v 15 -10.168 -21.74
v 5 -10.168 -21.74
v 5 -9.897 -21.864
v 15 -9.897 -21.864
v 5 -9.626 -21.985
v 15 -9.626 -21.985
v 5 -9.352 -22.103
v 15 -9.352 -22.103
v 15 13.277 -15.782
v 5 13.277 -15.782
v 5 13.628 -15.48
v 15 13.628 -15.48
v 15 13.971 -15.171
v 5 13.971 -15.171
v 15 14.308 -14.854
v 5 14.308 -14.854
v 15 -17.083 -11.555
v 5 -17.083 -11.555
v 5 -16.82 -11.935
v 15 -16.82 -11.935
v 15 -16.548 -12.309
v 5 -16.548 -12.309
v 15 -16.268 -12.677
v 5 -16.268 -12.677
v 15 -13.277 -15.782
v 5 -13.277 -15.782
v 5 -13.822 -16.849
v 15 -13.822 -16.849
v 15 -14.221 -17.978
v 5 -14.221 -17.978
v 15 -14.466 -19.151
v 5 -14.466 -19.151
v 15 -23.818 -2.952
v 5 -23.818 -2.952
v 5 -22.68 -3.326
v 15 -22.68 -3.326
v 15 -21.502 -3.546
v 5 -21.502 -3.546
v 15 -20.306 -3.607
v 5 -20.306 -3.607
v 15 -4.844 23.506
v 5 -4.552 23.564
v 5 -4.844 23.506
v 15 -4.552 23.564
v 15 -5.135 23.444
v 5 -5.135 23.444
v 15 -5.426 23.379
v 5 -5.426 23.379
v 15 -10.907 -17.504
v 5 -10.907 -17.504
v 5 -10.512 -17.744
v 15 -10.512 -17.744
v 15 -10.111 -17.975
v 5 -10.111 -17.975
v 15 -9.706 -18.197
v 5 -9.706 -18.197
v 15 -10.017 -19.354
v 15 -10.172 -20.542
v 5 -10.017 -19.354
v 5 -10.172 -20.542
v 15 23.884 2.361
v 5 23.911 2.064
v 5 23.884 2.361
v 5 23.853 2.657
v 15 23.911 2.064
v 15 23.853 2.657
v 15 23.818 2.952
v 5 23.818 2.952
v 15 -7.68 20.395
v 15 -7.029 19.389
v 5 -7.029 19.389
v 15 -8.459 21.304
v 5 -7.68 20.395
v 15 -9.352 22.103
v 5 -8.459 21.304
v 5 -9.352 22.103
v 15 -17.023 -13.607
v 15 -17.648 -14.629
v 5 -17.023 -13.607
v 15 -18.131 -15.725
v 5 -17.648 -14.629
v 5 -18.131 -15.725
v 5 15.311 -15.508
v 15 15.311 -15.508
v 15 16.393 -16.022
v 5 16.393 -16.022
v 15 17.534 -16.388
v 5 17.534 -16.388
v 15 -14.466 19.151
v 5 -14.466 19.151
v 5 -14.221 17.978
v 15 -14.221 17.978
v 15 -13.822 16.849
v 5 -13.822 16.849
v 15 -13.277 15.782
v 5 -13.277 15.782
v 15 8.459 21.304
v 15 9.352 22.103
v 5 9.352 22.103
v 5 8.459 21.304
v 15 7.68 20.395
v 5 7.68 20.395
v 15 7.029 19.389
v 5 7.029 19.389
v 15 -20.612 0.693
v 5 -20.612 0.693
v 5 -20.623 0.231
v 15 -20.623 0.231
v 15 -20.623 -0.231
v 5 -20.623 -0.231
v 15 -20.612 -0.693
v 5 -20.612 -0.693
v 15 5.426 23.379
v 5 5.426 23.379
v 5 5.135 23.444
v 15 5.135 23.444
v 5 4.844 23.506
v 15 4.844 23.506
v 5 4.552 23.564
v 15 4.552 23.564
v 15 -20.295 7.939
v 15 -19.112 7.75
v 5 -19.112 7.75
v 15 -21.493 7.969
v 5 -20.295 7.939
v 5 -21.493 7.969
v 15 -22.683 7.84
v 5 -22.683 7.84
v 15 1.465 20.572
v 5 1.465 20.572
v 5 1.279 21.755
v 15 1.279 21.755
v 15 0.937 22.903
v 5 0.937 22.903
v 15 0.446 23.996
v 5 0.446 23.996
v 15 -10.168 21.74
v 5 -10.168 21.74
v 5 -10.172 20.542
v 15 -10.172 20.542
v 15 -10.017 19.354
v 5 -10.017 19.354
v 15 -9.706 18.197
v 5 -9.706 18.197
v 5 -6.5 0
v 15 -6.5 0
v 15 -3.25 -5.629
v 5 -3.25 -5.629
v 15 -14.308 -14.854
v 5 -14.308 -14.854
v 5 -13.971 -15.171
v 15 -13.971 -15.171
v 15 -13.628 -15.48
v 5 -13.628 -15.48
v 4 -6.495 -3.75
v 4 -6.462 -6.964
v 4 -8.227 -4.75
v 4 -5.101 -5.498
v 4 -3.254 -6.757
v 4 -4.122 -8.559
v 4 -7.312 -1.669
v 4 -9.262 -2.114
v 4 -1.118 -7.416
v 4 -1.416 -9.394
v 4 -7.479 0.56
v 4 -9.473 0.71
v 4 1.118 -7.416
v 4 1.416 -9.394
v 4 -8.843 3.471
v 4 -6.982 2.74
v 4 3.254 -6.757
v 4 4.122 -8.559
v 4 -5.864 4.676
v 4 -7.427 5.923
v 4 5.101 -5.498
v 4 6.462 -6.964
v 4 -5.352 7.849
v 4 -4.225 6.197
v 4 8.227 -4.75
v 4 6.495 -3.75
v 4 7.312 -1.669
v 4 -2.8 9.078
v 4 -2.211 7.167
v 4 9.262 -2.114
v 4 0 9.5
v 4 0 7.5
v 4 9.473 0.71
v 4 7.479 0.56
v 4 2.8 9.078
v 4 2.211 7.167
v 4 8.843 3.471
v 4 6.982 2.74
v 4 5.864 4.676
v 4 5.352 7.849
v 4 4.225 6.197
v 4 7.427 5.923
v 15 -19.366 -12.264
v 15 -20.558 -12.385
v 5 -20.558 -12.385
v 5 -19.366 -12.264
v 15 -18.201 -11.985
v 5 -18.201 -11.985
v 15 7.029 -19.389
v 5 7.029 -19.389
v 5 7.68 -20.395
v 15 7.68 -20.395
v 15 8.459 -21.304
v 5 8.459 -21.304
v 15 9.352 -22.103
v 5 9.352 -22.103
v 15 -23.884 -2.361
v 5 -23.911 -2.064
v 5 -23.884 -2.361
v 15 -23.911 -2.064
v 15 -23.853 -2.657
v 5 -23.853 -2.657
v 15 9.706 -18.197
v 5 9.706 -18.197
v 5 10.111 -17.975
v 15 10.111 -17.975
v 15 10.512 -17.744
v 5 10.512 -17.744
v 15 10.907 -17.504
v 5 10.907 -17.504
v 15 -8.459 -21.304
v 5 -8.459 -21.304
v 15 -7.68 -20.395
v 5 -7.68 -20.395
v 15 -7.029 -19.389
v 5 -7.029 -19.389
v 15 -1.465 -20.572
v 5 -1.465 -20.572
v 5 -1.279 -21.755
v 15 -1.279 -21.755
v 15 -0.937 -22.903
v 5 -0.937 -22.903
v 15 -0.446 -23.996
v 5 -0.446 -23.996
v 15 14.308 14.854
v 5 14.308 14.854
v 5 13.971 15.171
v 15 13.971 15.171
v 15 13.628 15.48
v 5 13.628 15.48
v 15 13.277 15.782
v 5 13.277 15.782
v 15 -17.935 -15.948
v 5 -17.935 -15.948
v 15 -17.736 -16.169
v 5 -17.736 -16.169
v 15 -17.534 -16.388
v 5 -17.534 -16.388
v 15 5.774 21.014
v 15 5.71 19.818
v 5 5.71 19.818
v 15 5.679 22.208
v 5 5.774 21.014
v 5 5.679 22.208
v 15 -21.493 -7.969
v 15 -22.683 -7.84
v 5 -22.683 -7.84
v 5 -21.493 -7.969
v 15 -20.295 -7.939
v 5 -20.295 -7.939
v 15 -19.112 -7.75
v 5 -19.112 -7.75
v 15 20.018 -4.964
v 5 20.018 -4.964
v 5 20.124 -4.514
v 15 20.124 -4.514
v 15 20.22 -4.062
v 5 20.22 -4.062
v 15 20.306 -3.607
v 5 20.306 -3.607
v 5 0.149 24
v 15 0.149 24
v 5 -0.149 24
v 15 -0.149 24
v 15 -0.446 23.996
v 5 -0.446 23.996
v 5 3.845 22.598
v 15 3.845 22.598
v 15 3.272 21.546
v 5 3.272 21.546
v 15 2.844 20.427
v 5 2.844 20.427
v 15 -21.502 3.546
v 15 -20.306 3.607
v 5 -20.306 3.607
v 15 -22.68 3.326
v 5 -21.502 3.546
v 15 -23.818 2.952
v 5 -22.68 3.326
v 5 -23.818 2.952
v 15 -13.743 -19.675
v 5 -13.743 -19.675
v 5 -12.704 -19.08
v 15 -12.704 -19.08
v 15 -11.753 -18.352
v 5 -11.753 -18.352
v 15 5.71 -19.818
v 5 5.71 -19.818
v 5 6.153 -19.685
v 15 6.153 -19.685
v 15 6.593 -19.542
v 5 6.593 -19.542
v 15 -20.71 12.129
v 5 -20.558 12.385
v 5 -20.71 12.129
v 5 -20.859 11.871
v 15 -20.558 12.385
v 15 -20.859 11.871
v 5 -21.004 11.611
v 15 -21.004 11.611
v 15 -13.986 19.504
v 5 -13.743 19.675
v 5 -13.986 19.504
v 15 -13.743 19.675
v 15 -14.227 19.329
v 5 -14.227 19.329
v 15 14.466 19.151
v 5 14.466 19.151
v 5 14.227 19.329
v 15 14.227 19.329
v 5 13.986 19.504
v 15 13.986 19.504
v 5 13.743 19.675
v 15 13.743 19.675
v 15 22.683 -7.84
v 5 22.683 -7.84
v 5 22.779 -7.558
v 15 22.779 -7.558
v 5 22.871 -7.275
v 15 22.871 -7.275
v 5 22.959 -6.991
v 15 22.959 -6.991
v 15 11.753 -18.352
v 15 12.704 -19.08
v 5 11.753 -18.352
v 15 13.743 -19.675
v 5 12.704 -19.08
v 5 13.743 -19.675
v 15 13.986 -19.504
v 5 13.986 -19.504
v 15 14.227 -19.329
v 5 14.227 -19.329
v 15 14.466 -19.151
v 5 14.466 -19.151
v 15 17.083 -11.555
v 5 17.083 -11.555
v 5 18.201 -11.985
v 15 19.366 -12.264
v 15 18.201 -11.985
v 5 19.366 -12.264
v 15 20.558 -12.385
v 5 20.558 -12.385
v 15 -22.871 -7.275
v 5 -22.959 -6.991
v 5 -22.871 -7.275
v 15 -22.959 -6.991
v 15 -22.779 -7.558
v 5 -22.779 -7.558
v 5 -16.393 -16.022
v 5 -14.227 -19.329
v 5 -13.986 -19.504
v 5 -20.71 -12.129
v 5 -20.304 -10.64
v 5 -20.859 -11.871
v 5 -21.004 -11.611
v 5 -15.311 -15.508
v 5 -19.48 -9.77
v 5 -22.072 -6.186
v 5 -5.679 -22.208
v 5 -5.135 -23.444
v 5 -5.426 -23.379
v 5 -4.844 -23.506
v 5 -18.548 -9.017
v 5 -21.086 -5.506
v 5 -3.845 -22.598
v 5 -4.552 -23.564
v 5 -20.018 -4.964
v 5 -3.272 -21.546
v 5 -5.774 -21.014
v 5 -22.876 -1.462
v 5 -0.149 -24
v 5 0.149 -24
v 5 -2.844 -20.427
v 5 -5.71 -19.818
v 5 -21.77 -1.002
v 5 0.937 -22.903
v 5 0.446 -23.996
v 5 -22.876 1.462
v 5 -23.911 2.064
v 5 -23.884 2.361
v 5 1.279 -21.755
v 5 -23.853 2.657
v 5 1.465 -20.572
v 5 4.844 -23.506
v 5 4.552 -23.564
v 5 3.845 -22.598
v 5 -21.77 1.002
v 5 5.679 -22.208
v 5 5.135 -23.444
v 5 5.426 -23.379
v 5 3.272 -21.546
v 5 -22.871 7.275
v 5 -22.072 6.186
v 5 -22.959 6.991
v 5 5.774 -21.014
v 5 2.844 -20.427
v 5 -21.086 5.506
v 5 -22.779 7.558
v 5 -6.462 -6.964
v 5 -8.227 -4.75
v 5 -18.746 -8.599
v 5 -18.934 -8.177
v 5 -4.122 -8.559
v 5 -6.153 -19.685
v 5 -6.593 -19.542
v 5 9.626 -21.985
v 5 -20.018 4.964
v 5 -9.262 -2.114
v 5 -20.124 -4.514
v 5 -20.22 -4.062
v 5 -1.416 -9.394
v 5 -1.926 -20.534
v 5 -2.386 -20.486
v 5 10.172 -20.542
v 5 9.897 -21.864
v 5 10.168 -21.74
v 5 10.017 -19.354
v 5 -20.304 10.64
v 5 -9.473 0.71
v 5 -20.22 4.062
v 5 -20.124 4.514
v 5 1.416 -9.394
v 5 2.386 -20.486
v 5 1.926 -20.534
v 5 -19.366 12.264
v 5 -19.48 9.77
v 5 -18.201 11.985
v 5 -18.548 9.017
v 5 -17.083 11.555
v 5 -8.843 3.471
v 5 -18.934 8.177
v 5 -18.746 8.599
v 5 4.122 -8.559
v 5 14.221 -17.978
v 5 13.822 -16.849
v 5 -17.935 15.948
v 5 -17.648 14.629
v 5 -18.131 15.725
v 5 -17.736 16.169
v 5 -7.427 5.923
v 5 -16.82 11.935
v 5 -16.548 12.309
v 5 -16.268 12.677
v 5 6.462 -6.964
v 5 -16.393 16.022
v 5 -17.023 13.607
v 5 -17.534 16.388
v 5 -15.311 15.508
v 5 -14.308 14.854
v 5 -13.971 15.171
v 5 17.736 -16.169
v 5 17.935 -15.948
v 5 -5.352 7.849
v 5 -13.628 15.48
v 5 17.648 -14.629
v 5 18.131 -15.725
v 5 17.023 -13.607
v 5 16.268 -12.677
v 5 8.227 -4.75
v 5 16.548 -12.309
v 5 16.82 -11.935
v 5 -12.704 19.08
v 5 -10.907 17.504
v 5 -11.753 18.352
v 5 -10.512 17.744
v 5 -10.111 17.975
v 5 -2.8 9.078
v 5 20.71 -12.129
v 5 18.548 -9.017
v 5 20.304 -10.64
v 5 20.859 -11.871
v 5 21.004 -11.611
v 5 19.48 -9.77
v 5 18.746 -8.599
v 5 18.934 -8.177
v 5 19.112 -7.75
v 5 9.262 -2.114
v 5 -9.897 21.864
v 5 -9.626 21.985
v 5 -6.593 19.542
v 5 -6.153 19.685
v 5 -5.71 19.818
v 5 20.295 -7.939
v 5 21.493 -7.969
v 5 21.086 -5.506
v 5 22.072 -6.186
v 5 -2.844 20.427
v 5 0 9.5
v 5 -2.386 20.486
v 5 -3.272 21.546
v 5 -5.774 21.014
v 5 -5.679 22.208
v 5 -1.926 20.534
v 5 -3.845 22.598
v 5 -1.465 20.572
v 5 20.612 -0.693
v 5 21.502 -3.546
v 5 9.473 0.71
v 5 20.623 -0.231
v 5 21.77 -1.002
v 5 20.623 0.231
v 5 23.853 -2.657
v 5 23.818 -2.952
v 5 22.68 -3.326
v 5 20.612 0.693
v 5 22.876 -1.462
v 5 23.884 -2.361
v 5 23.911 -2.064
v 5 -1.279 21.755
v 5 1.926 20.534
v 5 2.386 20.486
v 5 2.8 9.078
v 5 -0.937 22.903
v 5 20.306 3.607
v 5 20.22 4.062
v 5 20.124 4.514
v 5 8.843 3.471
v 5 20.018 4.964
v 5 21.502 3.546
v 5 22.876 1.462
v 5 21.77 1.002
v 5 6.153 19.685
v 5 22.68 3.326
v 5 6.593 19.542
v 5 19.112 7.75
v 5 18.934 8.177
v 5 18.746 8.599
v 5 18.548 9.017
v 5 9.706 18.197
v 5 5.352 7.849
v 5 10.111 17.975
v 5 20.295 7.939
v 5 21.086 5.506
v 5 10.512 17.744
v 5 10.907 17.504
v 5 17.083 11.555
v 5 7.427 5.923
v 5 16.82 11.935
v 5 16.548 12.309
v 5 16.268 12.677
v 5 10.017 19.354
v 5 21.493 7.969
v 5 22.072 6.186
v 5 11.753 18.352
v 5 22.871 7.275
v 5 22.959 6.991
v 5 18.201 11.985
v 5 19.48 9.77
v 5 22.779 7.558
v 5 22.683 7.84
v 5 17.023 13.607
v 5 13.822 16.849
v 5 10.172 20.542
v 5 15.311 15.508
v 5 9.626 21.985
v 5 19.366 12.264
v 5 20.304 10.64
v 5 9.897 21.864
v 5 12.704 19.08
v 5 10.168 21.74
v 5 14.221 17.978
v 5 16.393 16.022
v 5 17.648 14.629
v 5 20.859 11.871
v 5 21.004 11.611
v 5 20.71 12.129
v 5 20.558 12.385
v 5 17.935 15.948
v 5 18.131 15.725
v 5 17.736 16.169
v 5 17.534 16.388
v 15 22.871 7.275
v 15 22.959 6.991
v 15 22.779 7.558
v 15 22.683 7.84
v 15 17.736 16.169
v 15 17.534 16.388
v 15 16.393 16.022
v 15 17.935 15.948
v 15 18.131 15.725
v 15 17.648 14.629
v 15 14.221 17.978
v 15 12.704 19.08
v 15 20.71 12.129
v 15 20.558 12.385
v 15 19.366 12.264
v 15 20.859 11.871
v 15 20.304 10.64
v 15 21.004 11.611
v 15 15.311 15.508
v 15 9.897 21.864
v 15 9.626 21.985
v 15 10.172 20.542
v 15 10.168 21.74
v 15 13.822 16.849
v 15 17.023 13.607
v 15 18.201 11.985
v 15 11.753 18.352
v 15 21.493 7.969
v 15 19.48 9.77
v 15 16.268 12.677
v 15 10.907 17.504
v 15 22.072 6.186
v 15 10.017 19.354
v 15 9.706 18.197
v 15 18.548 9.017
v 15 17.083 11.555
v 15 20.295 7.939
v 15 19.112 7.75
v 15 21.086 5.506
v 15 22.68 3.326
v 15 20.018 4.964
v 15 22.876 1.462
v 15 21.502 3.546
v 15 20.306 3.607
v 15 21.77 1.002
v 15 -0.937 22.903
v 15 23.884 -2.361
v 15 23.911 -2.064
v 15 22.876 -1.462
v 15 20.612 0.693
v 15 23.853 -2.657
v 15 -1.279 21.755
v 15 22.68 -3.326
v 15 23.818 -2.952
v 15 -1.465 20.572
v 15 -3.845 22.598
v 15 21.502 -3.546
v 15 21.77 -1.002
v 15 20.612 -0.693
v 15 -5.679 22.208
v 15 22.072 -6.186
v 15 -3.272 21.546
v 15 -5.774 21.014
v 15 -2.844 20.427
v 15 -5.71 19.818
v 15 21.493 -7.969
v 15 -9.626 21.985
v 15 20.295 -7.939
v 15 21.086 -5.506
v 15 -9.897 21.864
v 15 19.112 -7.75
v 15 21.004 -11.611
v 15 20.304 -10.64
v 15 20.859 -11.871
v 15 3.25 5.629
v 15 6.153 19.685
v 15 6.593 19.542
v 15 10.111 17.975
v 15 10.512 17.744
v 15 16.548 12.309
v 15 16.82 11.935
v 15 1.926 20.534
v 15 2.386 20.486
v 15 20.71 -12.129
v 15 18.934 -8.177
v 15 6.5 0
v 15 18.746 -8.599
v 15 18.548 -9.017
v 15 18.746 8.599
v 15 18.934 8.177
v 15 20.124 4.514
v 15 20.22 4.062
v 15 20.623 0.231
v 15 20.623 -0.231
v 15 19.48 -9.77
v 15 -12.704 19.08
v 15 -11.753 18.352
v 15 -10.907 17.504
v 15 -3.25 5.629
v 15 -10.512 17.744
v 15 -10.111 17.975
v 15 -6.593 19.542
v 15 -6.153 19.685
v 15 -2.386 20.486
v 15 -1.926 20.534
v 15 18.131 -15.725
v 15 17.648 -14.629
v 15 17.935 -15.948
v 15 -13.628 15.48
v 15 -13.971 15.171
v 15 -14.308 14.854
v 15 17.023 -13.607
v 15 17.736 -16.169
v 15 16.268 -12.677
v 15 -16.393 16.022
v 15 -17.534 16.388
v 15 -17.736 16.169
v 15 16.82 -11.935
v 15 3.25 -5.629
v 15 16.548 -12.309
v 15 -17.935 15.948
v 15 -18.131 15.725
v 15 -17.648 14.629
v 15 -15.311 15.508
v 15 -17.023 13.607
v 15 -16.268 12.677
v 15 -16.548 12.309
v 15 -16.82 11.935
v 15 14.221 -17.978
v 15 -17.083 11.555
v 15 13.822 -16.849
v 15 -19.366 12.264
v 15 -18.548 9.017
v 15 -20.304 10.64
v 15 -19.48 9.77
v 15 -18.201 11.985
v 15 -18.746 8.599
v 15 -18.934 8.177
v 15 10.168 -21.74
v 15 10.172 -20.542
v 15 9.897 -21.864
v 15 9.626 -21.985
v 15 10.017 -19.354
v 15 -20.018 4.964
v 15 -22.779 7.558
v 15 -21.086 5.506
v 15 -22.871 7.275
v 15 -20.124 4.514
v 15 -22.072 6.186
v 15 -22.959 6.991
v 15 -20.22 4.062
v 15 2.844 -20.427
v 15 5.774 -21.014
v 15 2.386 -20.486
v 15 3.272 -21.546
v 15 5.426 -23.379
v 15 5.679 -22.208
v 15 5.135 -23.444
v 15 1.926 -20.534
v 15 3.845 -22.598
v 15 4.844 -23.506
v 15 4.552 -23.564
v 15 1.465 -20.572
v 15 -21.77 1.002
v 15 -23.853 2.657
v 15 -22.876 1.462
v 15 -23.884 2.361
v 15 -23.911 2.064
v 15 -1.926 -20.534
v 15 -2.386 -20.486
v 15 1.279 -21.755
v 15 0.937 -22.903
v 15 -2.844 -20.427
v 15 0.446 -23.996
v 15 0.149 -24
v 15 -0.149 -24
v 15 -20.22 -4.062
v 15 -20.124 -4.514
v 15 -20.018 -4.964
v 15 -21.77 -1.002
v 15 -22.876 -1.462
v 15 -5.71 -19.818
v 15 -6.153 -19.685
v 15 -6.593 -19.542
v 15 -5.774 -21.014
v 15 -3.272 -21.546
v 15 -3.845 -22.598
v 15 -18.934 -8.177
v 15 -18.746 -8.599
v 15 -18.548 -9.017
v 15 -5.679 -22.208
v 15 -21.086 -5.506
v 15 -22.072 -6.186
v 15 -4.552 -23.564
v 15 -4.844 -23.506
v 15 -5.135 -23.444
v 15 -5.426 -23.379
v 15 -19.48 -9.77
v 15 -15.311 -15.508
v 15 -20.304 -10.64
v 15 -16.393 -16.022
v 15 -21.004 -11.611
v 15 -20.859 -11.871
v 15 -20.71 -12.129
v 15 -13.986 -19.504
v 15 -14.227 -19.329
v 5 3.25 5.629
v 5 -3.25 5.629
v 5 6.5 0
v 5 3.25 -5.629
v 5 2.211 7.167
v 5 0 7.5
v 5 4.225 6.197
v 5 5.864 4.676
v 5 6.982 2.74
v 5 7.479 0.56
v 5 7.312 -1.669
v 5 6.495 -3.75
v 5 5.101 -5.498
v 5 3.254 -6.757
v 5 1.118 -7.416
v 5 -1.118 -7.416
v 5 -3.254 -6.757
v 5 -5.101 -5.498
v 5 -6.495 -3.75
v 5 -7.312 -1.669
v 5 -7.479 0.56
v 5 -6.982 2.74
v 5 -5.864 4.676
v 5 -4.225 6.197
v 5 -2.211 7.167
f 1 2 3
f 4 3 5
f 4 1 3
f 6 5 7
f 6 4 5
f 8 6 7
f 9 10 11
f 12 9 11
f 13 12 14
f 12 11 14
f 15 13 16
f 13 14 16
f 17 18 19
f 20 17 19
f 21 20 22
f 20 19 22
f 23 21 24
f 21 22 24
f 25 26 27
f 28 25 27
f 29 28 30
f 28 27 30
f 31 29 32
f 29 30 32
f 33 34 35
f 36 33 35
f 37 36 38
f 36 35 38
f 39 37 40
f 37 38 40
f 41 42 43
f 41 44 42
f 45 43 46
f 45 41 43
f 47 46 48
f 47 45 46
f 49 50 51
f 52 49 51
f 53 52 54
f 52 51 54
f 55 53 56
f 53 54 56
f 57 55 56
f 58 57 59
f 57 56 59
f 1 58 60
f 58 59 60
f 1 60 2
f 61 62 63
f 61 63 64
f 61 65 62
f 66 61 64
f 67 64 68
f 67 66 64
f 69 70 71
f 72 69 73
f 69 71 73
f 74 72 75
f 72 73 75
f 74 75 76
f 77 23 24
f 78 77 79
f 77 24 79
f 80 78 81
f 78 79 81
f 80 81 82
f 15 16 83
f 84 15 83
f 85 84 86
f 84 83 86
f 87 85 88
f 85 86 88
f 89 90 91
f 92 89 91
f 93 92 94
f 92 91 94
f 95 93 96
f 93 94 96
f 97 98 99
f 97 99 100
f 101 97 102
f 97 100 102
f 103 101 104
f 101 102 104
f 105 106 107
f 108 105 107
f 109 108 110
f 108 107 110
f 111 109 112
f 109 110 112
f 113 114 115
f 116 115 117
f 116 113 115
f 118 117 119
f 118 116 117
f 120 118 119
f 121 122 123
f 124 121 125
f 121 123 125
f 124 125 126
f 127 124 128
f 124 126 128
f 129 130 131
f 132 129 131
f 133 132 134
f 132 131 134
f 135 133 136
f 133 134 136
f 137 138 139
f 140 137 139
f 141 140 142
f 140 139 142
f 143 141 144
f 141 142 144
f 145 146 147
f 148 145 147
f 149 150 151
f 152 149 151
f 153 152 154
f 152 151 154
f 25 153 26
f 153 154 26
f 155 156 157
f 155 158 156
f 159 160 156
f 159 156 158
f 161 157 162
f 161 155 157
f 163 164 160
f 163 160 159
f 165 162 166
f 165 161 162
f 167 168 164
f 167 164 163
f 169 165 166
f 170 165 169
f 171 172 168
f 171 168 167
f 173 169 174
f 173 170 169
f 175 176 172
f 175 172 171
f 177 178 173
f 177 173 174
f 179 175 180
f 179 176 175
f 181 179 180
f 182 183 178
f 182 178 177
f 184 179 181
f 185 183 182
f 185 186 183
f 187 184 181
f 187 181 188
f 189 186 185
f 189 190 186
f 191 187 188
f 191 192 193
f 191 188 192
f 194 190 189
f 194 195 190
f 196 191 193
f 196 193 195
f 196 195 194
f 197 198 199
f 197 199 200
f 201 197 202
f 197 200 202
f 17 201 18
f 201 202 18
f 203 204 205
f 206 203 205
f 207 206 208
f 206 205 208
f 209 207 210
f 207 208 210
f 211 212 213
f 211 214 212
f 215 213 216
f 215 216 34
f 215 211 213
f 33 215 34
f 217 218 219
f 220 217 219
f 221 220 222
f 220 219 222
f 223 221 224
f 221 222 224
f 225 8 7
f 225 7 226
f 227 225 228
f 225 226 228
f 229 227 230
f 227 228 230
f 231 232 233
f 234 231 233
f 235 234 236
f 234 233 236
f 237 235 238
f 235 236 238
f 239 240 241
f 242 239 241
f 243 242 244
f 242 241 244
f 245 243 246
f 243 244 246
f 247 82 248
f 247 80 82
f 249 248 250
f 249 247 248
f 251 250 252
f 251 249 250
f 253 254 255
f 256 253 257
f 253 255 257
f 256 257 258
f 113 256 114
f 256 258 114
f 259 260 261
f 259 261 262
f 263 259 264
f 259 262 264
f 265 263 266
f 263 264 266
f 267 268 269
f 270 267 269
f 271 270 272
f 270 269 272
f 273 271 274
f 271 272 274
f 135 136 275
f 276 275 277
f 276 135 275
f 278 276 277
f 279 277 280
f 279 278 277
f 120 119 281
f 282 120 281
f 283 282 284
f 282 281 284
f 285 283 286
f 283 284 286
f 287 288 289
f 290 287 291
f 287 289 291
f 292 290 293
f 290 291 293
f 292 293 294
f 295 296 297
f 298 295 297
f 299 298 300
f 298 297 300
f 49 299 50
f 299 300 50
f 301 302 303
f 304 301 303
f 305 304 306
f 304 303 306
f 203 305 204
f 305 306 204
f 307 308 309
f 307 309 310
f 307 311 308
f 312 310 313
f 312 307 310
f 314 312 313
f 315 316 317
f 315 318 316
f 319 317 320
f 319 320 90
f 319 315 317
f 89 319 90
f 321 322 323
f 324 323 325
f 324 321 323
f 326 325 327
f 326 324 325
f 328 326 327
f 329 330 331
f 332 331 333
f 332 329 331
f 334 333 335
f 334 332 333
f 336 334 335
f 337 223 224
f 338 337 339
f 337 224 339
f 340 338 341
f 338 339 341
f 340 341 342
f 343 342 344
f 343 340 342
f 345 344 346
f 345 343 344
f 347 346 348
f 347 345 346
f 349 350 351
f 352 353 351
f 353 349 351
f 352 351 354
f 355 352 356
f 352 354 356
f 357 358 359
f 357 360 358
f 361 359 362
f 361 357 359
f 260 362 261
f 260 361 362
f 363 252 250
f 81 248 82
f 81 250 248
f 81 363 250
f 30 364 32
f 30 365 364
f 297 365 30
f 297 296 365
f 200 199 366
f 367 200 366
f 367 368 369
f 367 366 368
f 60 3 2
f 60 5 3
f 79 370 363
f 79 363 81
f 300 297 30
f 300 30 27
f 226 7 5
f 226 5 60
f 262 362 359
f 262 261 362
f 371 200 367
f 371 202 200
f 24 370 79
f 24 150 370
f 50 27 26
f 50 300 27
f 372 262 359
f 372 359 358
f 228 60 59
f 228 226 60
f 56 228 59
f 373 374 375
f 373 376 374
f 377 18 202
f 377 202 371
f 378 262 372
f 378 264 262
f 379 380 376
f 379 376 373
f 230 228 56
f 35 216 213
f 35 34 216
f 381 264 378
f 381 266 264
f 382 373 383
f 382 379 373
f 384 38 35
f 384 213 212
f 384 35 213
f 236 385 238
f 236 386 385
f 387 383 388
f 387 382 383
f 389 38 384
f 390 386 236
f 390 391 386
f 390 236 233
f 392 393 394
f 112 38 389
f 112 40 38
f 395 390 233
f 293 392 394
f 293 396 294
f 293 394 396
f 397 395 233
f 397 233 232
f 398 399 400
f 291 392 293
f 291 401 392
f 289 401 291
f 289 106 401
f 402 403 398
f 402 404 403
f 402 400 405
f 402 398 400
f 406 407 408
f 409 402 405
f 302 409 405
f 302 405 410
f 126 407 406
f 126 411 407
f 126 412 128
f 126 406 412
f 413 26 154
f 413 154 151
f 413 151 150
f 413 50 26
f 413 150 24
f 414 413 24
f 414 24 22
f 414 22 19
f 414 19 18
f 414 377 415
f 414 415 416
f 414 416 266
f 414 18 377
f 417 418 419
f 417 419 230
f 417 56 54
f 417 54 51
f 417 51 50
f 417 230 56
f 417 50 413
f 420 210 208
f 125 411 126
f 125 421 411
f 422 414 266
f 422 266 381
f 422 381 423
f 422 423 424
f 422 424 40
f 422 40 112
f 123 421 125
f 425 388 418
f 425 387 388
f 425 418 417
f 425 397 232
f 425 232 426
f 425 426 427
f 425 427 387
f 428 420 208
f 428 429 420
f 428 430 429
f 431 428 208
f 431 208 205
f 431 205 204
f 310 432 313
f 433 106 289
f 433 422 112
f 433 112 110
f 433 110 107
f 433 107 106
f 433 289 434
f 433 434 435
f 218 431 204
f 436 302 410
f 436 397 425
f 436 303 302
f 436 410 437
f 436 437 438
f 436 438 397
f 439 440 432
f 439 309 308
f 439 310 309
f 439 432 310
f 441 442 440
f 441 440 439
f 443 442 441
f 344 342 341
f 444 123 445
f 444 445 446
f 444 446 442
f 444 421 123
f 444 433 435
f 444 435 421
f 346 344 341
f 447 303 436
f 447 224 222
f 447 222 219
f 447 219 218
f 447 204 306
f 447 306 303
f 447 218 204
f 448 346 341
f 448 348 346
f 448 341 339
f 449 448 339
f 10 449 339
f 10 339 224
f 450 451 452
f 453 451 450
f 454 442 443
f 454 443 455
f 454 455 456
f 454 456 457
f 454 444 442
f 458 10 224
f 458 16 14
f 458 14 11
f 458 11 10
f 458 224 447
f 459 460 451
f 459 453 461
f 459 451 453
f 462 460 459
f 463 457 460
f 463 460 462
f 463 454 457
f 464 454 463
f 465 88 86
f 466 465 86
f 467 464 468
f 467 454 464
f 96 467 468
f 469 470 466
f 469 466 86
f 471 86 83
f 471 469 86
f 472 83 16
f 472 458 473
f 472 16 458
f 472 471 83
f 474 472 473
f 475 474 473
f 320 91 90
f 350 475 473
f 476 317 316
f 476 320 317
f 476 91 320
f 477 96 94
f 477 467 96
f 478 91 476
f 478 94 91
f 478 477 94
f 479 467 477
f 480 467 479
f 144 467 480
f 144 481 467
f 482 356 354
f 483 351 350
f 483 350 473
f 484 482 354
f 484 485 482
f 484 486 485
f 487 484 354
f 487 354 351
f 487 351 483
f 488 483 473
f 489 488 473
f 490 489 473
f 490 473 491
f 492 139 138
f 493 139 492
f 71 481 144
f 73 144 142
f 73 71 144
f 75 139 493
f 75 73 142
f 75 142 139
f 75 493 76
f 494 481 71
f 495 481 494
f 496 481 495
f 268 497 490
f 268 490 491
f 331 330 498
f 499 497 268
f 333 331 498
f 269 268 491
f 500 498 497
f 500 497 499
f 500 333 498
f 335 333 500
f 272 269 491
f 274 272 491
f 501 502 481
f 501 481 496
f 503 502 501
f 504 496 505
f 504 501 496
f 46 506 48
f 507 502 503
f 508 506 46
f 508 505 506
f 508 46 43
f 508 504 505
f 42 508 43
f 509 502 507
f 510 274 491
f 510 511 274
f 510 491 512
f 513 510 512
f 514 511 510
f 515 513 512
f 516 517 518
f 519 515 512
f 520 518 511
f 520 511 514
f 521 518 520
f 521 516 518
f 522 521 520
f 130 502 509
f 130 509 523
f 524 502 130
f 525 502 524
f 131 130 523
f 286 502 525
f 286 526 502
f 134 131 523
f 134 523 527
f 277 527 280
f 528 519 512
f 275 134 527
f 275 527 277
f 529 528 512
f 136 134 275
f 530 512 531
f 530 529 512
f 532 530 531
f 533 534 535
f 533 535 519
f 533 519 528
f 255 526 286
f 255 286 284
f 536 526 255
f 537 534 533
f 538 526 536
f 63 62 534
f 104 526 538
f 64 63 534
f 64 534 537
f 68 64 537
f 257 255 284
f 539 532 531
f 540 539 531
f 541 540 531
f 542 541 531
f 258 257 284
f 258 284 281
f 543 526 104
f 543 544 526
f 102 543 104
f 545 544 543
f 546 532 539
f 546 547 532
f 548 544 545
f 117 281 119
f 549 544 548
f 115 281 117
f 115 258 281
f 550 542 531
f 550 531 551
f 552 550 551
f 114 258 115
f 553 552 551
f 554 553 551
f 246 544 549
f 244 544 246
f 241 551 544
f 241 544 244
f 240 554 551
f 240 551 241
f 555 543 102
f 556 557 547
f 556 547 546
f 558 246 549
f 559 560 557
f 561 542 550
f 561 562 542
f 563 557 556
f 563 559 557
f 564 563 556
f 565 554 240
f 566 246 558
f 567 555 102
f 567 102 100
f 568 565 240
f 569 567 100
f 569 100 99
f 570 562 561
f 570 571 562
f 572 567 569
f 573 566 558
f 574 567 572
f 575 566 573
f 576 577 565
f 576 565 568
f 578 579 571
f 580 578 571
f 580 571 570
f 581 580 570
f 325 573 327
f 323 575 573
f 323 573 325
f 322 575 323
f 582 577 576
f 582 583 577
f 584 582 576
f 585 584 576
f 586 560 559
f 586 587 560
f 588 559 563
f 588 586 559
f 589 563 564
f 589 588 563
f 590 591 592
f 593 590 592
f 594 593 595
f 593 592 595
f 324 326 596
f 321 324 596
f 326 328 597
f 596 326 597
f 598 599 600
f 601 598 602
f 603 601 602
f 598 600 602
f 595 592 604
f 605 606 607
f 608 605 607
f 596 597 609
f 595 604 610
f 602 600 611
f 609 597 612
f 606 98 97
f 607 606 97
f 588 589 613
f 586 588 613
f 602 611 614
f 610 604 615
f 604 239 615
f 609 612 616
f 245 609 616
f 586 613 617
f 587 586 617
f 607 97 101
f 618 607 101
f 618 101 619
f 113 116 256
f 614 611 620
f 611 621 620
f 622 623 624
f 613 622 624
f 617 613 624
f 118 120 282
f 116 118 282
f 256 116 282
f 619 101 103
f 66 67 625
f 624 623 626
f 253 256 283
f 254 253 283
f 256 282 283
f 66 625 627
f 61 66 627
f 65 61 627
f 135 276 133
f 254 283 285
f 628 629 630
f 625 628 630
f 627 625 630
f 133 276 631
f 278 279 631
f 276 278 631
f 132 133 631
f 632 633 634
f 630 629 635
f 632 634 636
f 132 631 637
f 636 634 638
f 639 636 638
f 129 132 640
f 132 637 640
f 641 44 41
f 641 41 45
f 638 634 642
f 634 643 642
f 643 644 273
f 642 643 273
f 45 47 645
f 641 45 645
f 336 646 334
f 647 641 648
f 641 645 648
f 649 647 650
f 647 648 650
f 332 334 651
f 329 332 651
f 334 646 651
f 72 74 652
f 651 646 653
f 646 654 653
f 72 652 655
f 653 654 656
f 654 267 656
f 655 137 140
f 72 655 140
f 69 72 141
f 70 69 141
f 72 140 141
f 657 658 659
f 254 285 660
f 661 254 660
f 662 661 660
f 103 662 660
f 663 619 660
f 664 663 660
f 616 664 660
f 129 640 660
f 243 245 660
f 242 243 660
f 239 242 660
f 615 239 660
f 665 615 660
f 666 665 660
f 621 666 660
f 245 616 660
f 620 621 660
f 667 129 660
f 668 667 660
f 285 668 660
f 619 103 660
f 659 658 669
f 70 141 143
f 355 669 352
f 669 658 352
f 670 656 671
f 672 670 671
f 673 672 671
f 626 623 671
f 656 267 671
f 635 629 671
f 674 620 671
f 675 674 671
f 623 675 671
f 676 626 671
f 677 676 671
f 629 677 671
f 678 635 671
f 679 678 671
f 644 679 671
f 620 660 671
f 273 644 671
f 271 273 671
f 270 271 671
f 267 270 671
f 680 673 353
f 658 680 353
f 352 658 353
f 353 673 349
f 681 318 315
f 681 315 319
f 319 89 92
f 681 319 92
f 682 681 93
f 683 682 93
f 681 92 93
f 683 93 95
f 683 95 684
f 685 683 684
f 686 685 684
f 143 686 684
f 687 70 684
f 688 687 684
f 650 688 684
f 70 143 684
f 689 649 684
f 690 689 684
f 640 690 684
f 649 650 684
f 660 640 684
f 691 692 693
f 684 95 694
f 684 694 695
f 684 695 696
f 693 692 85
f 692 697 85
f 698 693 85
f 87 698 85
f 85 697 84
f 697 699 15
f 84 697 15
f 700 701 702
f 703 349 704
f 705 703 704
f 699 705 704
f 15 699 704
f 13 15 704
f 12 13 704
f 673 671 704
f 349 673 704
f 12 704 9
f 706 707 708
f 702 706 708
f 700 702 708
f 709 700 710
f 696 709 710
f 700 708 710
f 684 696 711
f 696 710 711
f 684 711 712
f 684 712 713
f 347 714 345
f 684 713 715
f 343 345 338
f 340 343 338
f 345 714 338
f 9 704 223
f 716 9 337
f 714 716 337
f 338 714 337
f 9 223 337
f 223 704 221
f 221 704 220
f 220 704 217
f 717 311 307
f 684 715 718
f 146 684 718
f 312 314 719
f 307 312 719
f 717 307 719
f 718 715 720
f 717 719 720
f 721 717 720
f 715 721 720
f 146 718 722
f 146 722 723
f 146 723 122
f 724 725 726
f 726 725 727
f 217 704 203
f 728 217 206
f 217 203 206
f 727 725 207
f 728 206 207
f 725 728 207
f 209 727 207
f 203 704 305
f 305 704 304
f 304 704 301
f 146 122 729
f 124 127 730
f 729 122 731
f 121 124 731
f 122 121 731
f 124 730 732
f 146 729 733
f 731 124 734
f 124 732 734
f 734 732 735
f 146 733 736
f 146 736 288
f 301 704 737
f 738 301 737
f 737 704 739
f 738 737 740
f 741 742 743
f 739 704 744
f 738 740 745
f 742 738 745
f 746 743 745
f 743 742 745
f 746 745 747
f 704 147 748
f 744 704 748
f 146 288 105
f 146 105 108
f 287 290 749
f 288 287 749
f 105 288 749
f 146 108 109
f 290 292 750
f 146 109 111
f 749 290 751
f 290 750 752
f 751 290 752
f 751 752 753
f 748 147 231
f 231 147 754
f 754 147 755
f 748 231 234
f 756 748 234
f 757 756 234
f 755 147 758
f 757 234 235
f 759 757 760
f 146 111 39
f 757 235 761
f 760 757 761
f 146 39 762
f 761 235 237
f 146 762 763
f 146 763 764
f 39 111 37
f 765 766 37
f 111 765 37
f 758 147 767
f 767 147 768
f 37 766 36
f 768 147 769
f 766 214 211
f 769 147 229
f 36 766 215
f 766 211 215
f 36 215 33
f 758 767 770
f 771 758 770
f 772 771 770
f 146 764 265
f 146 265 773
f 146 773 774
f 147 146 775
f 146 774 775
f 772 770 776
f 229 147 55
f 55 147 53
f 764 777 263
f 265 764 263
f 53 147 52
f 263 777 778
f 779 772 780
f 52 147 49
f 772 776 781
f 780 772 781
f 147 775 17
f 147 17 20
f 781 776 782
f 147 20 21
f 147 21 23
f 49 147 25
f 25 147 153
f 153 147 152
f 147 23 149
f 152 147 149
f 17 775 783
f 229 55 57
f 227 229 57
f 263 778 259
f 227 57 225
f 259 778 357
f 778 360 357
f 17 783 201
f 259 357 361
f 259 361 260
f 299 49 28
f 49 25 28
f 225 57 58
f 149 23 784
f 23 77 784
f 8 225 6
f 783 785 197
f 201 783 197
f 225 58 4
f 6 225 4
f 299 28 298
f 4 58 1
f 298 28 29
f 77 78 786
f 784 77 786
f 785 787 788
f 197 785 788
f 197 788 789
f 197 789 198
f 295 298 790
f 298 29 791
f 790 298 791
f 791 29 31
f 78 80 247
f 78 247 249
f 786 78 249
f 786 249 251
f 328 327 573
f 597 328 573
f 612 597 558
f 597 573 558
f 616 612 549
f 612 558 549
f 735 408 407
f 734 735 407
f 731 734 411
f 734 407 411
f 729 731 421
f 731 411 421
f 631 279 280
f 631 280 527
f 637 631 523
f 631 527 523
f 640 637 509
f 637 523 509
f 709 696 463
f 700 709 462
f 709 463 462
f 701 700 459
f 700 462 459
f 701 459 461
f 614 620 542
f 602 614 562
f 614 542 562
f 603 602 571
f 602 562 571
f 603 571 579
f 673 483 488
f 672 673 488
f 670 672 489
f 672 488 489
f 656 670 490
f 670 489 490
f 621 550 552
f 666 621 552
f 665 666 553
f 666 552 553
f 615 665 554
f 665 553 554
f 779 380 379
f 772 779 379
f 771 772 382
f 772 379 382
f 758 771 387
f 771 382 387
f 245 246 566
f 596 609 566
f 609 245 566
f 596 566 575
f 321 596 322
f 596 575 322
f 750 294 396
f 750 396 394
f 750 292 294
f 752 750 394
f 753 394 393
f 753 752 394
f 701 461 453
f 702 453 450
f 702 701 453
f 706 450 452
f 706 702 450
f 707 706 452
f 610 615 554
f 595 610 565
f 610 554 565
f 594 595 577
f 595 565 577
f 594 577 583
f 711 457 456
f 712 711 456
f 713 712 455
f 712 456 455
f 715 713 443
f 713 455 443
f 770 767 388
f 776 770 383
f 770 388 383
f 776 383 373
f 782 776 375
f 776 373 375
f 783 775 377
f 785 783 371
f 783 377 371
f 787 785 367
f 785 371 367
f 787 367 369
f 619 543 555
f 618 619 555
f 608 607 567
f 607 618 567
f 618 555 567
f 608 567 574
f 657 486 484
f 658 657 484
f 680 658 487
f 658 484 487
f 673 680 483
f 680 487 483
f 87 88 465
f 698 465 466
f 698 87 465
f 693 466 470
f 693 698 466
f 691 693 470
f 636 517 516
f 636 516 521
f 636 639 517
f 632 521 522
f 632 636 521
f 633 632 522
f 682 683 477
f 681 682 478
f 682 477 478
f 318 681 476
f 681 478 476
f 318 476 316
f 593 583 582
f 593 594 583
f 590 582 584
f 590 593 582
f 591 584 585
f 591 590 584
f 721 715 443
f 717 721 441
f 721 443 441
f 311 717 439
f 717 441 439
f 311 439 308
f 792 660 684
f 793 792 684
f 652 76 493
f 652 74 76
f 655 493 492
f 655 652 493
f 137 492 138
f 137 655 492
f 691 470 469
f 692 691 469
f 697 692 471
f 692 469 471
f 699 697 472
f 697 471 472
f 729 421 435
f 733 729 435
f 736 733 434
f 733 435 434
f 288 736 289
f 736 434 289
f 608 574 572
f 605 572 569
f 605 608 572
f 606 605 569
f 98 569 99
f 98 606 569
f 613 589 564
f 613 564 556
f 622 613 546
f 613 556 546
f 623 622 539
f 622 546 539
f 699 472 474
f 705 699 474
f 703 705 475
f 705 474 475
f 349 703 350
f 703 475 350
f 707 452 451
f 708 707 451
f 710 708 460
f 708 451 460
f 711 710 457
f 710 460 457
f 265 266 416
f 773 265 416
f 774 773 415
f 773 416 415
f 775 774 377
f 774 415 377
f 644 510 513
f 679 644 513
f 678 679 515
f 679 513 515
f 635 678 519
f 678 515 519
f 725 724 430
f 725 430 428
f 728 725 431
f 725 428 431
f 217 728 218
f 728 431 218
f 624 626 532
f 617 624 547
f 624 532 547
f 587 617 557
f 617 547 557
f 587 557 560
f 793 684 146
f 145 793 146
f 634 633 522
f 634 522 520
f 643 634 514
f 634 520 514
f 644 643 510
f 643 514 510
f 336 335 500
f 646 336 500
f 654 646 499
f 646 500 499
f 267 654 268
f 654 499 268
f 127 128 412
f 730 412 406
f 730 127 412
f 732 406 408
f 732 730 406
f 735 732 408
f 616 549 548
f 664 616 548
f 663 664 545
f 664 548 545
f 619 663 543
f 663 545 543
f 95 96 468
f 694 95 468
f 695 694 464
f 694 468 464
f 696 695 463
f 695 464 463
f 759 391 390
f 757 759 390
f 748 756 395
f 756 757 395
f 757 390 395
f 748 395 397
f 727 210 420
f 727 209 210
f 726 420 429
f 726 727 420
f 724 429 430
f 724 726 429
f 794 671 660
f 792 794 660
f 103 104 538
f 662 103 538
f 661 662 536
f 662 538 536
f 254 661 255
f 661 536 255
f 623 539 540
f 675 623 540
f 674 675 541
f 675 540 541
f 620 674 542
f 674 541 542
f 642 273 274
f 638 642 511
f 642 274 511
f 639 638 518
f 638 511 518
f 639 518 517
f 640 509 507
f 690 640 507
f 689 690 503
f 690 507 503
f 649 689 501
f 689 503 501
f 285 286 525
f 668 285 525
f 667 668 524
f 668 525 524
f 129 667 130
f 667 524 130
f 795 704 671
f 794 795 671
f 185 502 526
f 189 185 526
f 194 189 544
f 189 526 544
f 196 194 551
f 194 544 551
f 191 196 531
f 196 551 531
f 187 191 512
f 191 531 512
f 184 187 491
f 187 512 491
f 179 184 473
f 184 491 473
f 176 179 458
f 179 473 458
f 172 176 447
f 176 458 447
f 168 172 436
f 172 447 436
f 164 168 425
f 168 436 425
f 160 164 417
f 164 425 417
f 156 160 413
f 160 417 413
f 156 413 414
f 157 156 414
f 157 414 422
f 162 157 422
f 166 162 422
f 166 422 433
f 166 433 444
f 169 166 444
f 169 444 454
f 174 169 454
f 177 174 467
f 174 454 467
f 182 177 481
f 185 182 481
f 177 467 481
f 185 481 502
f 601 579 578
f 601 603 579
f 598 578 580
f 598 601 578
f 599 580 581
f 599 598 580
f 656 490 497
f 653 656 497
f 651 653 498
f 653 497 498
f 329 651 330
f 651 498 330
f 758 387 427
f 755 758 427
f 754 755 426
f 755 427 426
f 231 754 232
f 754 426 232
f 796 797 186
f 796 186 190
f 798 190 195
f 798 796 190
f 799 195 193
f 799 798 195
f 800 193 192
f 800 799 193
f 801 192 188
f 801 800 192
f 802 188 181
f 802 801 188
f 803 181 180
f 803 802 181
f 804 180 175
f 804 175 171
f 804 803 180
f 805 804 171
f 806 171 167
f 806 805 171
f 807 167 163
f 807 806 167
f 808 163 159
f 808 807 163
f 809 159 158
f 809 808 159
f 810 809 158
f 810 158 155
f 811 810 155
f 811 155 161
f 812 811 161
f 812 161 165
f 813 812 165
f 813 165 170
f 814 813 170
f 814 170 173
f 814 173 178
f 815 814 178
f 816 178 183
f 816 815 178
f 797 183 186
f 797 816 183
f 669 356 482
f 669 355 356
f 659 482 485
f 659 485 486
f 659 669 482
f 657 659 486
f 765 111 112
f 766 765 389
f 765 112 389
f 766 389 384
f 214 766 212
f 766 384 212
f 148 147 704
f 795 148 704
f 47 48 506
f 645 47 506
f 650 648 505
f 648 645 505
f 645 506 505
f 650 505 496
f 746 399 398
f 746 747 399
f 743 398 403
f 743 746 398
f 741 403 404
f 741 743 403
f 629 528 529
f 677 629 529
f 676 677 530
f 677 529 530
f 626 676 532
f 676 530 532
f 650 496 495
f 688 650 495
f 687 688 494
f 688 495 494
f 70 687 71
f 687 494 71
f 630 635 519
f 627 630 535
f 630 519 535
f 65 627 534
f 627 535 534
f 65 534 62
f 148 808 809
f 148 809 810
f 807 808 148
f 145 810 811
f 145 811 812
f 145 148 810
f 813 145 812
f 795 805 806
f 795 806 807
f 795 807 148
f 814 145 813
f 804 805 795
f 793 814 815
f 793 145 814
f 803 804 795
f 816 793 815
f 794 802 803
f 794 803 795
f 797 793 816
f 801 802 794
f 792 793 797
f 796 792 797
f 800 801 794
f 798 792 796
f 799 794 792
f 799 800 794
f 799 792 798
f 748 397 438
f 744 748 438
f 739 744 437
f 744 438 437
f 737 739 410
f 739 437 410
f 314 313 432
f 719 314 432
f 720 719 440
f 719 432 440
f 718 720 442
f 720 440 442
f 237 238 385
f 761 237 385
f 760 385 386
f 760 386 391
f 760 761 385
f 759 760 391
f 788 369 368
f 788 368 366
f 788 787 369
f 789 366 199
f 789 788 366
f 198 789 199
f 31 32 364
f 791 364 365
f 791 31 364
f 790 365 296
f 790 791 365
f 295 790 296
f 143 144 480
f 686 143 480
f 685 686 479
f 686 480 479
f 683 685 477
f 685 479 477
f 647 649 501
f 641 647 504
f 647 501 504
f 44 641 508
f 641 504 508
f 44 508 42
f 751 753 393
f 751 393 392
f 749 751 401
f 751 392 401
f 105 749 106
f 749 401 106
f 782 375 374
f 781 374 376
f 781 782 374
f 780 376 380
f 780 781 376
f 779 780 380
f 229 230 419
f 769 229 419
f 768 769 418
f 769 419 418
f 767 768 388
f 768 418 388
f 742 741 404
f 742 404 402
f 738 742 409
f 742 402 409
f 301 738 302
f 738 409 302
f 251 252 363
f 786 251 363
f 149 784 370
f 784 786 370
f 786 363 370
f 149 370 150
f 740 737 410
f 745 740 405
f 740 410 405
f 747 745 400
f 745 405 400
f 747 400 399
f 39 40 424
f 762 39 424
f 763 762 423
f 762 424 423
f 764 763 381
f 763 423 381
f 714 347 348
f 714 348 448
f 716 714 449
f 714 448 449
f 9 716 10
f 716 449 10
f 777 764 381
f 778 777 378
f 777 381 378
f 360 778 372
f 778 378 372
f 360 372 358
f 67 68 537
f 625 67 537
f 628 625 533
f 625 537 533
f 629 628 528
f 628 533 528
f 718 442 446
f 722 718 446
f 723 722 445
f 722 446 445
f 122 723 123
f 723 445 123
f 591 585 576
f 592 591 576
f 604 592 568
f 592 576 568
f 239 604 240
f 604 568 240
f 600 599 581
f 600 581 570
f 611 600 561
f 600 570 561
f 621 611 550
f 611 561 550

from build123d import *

# Parameters (mm, degrees)
BASPROSKE_W              = 15
BASPROSKE_H              = 24
TOOTHCUT_DEPTH           = 38.107950631
TEETHCUTS_COUNT          = 30
TEETHCUTS_ANGLE          = 348
BORSKE_R                 = 5
BORE_DEPTH               = 50.0000508
CORTE_EXTRUS_O1_DEPTH    = 38.050491393
ESBO_O2_R                = 30.603366169
CORTE_EXTRUS_O2_DEPTH    = 5
ESBO_O4_R                = 9.5
ESBO_O4_R_2              = 7.5
RESSALTO_EXTRUS_O1_DEPTH = 1


with BuildPart() as part:
    # BasProSke → Base-Revolve (revolve)
    with BuildSketch(Plane(origin=(0, 0, 0), x_dir=(1, 0, 0), z_dir=(0, 1, 0)), mode=Mode.PRIVATE) as base_revolve_sk:
        with Locations((7.5, 12)):
            Rectangle(BASPROSKE_W, BASPROSKE_H)
    revolve(base_revolve_sk.sketch.rotate(Axis((-10, 0, 0), (1, 0, 0)), 180), axis=Axis((-10, 0, 0), (1, 0, 0)))

    # TooCutSke → ToothCut (cut, through all)
    with BuildSketch(Plane(origin=(0, 0, 0), x_dir=(0, 0, -1), z_dir=(1, 0, 0))):
        with BuildLine():
            ThreePointArc((0.693278797, 20.612344372), (0, 20.624), (-0.693278797, 20.612344372))
            ThreePointArc((-0.693278797, 20.612344372), (-1.219042225, 22.34383125), (-2.080549663, 23.935144835))
            ThreePointArc((-2.080549663, 23.935144835), (0, 24.0254), (2.080549663, 23.935144835))
            ThreePointArc((2.080549663, 23.935144835), (1.219042225, 22.34383125), (0.693278797, 20.612344372))
        make_face()
    toothcut = extrude(amount=TOOTHCUT_DEPTH, mode=Mode.SUBTRACT)

    # TeethCuts: ToothCut ×30 about axis
    teethcuts_axis = Axis((-10, 0, 0), (1, 0, 0))
    for i in range(1, TEETHCUTS_COUNT):
        add(toothcut.rotate(teethcuts_axis, i * TEETHCUTS_ANGLE / (TEETHCUTS_COUNT - 1)), mode=Mode.SUBTRACT)

    # BorSke → Bore (cut, symmetric)
    with BuildSketch(Plane(origin=(0, 0, 0), x_dir=(0, 0, -1), z_dir=(1, 0, 0))):
        with Locations(Location((0, 0, 0), (0, 0, 180))):
            Circle(BORSKE_R)
    extrude(amount=BORE_DEPTH, both=True, mode=Mode.SUBTRACT)

    # Esboço1 → Corte-extrusão1 (cut, through all)
    with BuildSketch(Plane(origin=(15, 0, 0), x_dir=(0, 0, -1), z_dir=(1, 0, 0))):
        Polygon((0, 6.5), (-5.629165125, 3.25), (-5.629165125, -3.25), (0, -6.5), (5.629165125, -3.25), (5.629165125, 3.25), align=None)
    extrude(amount=-CORTE_EXTRUS_O1_DEPTH, mode=Mode.SUBTRACT)

    # Esboço2 → Corte-extrusão2 (cut)
    with BuildSketch(Plane.ZY):
        Circle(ESBO_O2_R)
    extrude(amount=-CORTE_EXTRUS_O2_DEPTH, mode=Mode.SUBTRACT)

    # Esboço4 → Ressalto-extrusão1 (add)
    with BuildSketch(Plane.ZY.offset(-5)):
        Circle(ESBO_O4_R)
        Circle(ESBO_O4_R_2, mode=Mode.SUBTRACT)
    extrude(amount=RESSALTO_EXTRUS_O1_DEPTH)


solid = part.part
